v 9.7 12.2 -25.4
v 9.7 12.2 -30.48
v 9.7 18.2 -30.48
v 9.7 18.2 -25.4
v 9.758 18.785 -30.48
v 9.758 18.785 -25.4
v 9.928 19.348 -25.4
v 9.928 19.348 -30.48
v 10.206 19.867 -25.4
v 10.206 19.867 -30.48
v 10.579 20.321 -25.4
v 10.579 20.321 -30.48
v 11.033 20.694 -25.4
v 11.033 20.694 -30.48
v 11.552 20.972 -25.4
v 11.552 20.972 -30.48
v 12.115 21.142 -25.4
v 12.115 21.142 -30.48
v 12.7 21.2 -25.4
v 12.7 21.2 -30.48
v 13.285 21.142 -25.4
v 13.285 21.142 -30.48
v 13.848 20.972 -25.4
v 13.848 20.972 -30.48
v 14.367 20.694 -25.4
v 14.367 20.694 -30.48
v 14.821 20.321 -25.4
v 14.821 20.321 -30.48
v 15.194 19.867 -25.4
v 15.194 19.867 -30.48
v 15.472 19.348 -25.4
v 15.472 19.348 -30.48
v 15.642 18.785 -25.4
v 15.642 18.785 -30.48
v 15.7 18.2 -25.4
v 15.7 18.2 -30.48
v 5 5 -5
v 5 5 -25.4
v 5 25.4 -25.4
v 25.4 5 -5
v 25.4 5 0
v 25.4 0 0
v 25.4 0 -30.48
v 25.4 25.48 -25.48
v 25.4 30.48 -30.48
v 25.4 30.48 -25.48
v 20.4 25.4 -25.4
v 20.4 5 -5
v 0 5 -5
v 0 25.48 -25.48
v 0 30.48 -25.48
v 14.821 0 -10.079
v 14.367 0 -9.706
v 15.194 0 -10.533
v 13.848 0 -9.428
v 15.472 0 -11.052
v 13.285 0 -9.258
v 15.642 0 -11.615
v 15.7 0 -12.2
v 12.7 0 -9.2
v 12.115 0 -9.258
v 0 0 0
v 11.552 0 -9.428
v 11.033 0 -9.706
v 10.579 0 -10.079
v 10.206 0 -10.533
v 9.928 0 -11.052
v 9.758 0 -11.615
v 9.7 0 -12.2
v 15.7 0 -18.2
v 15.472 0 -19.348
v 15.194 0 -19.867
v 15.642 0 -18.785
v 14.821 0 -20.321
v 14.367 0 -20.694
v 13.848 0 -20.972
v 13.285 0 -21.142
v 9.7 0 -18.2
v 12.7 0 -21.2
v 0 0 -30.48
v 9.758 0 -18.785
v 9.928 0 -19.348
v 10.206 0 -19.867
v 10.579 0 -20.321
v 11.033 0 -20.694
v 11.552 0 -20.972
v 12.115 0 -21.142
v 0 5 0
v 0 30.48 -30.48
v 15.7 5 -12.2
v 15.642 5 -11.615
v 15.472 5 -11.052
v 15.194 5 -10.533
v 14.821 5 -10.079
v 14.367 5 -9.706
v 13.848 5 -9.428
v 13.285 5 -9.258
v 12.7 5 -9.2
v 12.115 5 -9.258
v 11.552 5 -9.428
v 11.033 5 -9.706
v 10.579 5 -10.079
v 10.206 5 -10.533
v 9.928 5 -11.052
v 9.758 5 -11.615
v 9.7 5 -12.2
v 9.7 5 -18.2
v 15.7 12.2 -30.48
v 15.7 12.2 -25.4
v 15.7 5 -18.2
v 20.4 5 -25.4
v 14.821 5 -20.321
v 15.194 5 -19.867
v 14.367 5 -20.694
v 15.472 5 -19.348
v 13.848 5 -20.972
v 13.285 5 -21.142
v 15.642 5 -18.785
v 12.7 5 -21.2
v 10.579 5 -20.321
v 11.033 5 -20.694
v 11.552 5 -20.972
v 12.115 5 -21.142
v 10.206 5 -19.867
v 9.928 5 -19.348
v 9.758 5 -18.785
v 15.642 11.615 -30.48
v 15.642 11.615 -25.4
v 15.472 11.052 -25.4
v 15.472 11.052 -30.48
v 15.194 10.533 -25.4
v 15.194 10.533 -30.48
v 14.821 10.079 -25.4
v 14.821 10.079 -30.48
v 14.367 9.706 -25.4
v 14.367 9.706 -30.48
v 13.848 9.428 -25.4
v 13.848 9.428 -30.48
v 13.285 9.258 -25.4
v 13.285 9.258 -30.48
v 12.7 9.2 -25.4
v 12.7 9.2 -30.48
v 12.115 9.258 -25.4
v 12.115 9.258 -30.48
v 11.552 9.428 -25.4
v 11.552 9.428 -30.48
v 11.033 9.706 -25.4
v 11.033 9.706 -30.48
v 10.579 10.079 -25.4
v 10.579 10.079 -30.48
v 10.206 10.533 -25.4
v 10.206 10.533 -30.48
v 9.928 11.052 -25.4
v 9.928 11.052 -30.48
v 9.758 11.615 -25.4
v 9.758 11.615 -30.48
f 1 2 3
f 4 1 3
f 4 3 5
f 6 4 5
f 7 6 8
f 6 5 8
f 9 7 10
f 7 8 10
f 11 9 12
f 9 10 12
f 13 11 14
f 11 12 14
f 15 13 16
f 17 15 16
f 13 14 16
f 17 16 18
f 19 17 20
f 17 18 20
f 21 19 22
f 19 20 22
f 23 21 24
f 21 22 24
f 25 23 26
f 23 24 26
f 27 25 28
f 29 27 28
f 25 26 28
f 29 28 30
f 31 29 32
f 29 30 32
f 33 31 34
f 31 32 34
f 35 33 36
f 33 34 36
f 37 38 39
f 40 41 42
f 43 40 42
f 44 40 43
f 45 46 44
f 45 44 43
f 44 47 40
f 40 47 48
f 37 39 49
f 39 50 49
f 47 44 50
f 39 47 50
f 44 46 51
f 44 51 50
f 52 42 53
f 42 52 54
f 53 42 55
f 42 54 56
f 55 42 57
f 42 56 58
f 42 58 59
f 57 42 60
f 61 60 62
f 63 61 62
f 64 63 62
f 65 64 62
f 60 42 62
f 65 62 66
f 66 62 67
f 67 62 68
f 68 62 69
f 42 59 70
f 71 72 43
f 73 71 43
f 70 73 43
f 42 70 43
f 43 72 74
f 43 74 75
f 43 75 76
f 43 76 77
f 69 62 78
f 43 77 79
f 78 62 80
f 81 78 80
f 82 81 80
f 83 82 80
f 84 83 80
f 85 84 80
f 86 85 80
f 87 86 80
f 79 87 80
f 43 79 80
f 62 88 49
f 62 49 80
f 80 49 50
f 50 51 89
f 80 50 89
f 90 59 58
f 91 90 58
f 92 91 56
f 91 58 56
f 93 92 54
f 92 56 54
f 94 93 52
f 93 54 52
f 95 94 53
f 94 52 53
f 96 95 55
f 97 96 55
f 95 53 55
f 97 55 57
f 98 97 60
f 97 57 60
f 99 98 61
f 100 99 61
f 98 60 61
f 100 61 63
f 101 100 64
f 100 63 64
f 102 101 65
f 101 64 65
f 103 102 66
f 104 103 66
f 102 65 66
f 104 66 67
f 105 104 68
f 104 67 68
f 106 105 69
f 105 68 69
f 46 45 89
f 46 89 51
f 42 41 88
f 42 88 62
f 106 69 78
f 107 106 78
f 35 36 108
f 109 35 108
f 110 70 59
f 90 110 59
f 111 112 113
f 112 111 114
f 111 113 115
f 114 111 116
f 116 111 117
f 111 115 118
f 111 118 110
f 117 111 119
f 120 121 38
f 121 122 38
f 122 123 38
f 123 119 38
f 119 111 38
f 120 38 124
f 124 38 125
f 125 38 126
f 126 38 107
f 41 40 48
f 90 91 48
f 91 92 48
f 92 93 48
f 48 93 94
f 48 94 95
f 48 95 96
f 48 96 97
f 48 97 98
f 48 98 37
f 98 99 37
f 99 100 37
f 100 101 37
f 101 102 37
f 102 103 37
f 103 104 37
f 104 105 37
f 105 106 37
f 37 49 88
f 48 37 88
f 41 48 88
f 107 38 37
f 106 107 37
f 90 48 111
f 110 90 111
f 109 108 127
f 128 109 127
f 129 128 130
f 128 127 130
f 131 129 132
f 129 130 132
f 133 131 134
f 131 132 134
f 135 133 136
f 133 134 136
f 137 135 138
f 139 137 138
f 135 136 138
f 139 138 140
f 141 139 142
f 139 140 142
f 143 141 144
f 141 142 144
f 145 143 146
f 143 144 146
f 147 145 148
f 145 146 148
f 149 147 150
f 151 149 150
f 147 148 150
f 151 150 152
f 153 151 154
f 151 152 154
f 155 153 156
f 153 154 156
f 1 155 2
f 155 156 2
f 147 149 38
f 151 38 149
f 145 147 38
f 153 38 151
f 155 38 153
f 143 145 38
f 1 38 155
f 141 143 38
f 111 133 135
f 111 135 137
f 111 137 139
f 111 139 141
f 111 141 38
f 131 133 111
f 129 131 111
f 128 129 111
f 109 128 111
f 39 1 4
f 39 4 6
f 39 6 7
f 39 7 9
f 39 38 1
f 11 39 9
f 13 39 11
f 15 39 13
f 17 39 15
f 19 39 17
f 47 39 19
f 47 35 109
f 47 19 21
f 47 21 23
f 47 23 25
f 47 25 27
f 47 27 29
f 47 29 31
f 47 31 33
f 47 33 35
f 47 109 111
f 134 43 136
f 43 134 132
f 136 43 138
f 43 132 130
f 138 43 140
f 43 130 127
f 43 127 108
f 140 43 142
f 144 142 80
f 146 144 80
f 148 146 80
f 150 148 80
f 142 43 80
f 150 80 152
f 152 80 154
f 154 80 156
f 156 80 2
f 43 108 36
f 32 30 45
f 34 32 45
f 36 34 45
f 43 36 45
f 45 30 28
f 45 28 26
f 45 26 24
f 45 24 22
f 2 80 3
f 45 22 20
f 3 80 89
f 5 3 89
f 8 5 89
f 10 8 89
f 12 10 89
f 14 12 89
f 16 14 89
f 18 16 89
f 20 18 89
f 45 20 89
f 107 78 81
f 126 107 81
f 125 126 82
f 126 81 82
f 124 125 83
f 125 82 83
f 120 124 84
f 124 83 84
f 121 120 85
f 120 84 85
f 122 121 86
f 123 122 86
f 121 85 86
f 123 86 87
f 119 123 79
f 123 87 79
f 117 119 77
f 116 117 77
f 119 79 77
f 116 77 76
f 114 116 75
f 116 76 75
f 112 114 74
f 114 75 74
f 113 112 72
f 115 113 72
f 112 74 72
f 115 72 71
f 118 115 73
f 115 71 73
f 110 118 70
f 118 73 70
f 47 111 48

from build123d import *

# Parameters (mm, degrees)
BOSS_EXTRUDE1_DEPTH     = 25.4
SKETCH2_W               = 15.4
SKETCH2_H               = 20.48
CUT_EXTRUDE1_DEPTH      = 25.4
CUT_EXTRUDE2_DEPTH      = 48.109981957
CUT_EXTRUDE2_DEPTH_BACK = 48.109981957
CUT_EXTRUDE3_DEPTH      = 48.153163202
CUT_EXTRUDE3_DEPTH_BACK = 48.153163202


with BuildPart() as part:
    # Sketch1 → Boss-Extrude1 (new body)
    with BuildSketch(Plane(origin=(0, 0, 0), x_dir=(0, 0, -1), z_dir=(1, 0, 0))):
        Polygon((0, 0), (30.48, 0), (30.48, 30.48), (25.48, 30.48), (25.48, 25.48), (5, 5), (0, 5), align=None)
    extrude(amount=BOSS_EXTRUDE1_DEPTH)

    # Sketch2 → Cut-Extrude1 (cut)
    with BuildSketch(Plane.XY):
        with Locations((12.7, 15.24)):
            Rectangle(SKETCH2_W, SKETCH2_H)
    extrude(amount=-CUT_EXTRUDE1_DEPTH, mode=Mode.SUBTRACT)

    # Sketch3 → Cut-Extrude2 (cut, two sides: drawn at the far end of the back side and taken through both)
    with BuildSketch(Plane.XY.offset(-25.4).offset(-CUT_EXTRUDE2_DEPTH_BACK)):
        with BuildLine():
            Line((15.7, 18.2), (15.7, 12.2))
            ThreePointArc((15.7, 12.2), (12.7, 9.2), (9.7, 12.2))
            Line((9.7, 12.2), (9.7, 18.2))
            ThreePointArc((9.7, 18.2), (12.7, 21.2), (15.7, 18.2))
        make_face()
    extrude(amount=CUT_EXTRUDE2_DEPTH + CUT_EXTRUDE2_DEPTH_BACK, mode=Mode.SUBTRACT)

    # Sketch4 → Cut-Extrude3 (cut, two sides: drawn at the far end of the back side and taken through both)
    with BuildSketch(Plane(origin=(0, 5, 0), x_dir=(1, 0, 0), z_dir=(0, 1, 0)).offset(-CUT_EXTRUDE3_DEPTH_BACK)):
        with BuildLine():
            Line((15.7, 18.2), (15.7, 12.2))
            ThreePointArc((15.7, 12.2), (12.7, 9.2), (9.7, 12.2))
            Line((9.7, 12.2), (9.7, 18.2))
            ThreePointArc((9.7, 18.2), (12.7, 21.2), (15.7, 18.2))
        make_face()
    extrude(amount=CUT_EXTRUDE3_DEPTH + CUT_EXTRUDE3_DEPTH_BACK, mode=Mode.SUBTRACT)


solid = part.part
